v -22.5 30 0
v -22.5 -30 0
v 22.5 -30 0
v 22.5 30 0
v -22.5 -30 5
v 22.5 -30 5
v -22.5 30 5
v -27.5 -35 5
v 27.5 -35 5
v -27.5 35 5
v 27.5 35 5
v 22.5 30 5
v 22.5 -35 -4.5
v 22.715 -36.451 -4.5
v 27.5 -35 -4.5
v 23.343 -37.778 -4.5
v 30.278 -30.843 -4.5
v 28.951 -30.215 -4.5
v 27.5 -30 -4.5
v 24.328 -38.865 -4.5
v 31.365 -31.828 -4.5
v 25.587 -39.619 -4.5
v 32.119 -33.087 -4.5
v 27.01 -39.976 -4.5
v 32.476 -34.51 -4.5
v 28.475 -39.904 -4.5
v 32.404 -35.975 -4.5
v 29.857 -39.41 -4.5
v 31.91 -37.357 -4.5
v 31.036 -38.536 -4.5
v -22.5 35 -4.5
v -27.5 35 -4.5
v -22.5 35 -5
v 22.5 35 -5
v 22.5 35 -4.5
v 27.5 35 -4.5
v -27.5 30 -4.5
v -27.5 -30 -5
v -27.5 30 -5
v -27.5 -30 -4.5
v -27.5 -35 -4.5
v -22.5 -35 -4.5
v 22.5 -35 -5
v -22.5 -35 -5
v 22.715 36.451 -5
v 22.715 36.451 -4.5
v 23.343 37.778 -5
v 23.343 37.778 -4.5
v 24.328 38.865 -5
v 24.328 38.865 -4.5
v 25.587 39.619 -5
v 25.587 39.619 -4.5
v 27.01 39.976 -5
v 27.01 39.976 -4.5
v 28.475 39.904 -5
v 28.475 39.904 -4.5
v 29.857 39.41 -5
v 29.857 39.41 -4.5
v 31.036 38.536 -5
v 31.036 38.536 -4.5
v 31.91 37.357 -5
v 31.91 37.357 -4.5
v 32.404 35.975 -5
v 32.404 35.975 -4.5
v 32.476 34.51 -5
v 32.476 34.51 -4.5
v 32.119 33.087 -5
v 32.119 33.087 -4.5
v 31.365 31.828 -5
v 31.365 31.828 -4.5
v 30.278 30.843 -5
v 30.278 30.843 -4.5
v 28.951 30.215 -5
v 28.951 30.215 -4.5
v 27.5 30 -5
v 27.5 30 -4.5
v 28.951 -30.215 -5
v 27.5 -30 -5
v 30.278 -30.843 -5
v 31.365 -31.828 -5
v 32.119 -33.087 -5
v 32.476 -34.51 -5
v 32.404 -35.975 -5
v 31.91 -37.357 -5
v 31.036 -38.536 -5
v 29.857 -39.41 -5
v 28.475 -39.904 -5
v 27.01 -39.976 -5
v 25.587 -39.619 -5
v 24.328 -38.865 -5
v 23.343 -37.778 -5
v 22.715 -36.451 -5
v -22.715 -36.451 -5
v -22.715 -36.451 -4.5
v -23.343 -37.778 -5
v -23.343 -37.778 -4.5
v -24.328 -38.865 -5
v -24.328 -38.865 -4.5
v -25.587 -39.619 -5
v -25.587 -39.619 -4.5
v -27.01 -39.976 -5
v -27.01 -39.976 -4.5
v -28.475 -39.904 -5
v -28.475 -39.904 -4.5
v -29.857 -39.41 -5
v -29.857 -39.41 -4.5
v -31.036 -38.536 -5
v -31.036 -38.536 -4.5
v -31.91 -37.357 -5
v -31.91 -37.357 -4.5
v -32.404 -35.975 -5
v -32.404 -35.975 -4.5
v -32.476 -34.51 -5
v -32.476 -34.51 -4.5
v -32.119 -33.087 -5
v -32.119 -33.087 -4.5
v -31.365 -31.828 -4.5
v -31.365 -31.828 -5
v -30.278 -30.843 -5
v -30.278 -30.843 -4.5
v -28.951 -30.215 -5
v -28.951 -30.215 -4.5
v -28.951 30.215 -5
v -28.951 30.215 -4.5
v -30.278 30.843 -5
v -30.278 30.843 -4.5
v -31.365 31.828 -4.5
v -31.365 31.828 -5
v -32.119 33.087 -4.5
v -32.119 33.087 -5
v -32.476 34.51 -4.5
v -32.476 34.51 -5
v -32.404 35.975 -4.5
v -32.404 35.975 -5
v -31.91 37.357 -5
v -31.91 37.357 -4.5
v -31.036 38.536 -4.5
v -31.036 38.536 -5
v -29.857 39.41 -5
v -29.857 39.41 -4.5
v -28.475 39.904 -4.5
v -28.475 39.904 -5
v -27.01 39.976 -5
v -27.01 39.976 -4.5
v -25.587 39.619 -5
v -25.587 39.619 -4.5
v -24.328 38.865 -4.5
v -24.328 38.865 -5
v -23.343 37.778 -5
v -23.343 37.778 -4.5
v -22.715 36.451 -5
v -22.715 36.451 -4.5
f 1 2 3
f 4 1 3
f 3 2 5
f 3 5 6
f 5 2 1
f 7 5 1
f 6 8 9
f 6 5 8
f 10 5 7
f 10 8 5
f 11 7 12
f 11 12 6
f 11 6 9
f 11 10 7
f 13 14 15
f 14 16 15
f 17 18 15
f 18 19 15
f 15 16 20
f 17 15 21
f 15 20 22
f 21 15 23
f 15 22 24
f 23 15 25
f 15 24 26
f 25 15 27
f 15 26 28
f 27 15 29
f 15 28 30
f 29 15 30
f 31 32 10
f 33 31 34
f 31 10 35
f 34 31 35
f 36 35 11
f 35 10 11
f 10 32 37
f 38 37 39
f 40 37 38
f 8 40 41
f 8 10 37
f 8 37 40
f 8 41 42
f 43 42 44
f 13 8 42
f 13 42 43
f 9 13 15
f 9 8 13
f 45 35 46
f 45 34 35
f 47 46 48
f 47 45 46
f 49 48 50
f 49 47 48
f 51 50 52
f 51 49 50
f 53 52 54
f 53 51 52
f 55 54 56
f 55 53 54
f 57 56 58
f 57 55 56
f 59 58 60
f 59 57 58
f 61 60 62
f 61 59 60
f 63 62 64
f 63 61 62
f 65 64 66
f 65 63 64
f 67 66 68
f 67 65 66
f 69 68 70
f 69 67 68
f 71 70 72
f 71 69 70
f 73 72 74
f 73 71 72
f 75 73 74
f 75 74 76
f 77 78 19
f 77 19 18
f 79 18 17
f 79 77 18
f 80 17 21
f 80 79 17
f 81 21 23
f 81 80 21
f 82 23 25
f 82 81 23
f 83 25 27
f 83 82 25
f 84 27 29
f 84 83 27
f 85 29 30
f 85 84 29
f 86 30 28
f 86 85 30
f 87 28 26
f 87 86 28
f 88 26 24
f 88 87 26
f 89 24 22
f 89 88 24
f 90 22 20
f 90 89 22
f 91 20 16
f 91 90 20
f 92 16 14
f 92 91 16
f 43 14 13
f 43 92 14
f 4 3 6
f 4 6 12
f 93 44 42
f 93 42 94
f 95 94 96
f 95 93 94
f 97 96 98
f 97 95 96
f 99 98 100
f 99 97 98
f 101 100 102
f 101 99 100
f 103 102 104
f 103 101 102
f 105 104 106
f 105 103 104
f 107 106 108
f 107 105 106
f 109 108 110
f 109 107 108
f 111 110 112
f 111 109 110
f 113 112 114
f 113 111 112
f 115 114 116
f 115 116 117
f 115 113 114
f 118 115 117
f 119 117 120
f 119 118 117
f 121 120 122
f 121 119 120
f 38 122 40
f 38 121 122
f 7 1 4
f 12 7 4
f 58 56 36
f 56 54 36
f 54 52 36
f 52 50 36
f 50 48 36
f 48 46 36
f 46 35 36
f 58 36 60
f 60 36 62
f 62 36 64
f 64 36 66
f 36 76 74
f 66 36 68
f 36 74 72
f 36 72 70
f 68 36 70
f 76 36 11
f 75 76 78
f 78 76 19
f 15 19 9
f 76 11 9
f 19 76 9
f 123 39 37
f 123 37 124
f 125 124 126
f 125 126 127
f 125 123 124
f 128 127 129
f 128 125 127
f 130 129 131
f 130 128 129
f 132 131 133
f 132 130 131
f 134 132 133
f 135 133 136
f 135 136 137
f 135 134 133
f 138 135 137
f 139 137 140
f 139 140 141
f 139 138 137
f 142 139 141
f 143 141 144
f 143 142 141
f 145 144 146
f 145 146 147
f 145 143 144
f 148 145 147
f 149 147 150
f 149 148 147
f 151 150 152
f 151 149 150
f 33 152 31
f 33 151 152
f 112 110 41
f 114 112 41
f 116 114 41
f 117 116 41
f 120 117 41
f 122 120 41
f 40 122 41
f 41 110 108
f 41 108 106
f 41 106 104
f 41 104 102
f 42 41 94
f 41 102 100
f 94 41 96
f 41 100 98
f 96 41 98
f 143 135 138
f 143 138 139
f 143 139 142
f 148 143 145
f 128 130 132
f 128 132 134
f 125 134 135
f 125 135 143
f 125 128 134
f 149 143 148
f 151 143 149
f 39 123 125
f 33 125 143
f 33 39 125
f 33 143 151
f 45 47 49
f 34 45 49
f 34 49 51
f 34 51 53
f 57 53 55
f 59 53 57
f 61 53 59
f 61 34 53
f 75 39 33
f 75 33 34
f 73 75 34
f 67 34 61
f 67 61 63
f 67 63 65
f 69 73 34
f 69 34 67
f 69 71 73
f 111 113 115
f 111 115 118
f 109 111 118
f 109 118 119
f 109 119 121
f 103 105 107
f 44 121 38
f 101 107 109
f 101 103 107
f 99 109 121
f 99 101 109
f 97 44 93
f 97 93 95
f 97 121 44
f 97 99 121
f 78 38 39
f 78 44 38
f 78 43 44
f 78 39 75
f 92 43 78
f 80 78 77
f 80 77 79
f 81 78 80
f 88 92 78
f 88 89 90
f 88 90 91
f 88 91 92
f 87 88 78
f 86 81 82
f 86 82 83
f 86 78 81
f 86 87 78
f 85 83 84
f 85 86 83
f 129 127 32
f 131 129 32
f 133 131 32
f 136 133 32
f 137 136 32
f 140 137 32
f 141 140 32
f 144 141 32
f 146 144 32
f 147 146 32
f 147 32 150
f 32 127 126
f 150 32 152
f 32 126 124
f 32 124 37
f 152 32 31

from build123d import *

# Parameters (mm, degrees)
F0_W     = 55.000004
F0_H     = 70.000004
F0_W_2   = 45
F0_H_2   = 60
F1_DEPTH = 5
F2_W     = 55.000004
F2_H     = 70.000004
F3_DEPTH = 5
F4_R     = 5
F5_DEPTH = 0.5


with BuildPart() as f1:
    # F0 (on Top) → F1 (new body)
    with BuildSketch(Plane.XY):
        Rectangle(F0_W, F0_H)
        Rectangle(F0_W_2, F0_H_2, mode=Mode.SUBTRACT)
    extrude(amount=F1_DEPTH)

    # F2 (on face) → F3 (join)
    with BuildSketch(Plane(origin=(0, 0, 0), x_dir=(1, 0, 0), z_dir=(0, 0, -1))):
        Rectangle(F2_W, F2_H)
    extrude(amount=F3_DEPTH)

    # F4 (on face) → F5 (join)
    with BuildSketch(Plane(origin=(0, 0, -5), x_dir=(1, 0, 0), z_dir=(0, 0, -1))):
        with Locations((-27.500002, 35.000002)):
            Circle(F4_R)
        with Locations((27.500002, 35.000002)):
            Circle(F4_R)
        with Locations((27.500002, -35.000002)):
            Circle(F4_R)
        with Locations((-27.500002, -35.000002)):
            Circle(F4_R)
    extrude(amount=-F5_DEPTH)


solid = f1.part
